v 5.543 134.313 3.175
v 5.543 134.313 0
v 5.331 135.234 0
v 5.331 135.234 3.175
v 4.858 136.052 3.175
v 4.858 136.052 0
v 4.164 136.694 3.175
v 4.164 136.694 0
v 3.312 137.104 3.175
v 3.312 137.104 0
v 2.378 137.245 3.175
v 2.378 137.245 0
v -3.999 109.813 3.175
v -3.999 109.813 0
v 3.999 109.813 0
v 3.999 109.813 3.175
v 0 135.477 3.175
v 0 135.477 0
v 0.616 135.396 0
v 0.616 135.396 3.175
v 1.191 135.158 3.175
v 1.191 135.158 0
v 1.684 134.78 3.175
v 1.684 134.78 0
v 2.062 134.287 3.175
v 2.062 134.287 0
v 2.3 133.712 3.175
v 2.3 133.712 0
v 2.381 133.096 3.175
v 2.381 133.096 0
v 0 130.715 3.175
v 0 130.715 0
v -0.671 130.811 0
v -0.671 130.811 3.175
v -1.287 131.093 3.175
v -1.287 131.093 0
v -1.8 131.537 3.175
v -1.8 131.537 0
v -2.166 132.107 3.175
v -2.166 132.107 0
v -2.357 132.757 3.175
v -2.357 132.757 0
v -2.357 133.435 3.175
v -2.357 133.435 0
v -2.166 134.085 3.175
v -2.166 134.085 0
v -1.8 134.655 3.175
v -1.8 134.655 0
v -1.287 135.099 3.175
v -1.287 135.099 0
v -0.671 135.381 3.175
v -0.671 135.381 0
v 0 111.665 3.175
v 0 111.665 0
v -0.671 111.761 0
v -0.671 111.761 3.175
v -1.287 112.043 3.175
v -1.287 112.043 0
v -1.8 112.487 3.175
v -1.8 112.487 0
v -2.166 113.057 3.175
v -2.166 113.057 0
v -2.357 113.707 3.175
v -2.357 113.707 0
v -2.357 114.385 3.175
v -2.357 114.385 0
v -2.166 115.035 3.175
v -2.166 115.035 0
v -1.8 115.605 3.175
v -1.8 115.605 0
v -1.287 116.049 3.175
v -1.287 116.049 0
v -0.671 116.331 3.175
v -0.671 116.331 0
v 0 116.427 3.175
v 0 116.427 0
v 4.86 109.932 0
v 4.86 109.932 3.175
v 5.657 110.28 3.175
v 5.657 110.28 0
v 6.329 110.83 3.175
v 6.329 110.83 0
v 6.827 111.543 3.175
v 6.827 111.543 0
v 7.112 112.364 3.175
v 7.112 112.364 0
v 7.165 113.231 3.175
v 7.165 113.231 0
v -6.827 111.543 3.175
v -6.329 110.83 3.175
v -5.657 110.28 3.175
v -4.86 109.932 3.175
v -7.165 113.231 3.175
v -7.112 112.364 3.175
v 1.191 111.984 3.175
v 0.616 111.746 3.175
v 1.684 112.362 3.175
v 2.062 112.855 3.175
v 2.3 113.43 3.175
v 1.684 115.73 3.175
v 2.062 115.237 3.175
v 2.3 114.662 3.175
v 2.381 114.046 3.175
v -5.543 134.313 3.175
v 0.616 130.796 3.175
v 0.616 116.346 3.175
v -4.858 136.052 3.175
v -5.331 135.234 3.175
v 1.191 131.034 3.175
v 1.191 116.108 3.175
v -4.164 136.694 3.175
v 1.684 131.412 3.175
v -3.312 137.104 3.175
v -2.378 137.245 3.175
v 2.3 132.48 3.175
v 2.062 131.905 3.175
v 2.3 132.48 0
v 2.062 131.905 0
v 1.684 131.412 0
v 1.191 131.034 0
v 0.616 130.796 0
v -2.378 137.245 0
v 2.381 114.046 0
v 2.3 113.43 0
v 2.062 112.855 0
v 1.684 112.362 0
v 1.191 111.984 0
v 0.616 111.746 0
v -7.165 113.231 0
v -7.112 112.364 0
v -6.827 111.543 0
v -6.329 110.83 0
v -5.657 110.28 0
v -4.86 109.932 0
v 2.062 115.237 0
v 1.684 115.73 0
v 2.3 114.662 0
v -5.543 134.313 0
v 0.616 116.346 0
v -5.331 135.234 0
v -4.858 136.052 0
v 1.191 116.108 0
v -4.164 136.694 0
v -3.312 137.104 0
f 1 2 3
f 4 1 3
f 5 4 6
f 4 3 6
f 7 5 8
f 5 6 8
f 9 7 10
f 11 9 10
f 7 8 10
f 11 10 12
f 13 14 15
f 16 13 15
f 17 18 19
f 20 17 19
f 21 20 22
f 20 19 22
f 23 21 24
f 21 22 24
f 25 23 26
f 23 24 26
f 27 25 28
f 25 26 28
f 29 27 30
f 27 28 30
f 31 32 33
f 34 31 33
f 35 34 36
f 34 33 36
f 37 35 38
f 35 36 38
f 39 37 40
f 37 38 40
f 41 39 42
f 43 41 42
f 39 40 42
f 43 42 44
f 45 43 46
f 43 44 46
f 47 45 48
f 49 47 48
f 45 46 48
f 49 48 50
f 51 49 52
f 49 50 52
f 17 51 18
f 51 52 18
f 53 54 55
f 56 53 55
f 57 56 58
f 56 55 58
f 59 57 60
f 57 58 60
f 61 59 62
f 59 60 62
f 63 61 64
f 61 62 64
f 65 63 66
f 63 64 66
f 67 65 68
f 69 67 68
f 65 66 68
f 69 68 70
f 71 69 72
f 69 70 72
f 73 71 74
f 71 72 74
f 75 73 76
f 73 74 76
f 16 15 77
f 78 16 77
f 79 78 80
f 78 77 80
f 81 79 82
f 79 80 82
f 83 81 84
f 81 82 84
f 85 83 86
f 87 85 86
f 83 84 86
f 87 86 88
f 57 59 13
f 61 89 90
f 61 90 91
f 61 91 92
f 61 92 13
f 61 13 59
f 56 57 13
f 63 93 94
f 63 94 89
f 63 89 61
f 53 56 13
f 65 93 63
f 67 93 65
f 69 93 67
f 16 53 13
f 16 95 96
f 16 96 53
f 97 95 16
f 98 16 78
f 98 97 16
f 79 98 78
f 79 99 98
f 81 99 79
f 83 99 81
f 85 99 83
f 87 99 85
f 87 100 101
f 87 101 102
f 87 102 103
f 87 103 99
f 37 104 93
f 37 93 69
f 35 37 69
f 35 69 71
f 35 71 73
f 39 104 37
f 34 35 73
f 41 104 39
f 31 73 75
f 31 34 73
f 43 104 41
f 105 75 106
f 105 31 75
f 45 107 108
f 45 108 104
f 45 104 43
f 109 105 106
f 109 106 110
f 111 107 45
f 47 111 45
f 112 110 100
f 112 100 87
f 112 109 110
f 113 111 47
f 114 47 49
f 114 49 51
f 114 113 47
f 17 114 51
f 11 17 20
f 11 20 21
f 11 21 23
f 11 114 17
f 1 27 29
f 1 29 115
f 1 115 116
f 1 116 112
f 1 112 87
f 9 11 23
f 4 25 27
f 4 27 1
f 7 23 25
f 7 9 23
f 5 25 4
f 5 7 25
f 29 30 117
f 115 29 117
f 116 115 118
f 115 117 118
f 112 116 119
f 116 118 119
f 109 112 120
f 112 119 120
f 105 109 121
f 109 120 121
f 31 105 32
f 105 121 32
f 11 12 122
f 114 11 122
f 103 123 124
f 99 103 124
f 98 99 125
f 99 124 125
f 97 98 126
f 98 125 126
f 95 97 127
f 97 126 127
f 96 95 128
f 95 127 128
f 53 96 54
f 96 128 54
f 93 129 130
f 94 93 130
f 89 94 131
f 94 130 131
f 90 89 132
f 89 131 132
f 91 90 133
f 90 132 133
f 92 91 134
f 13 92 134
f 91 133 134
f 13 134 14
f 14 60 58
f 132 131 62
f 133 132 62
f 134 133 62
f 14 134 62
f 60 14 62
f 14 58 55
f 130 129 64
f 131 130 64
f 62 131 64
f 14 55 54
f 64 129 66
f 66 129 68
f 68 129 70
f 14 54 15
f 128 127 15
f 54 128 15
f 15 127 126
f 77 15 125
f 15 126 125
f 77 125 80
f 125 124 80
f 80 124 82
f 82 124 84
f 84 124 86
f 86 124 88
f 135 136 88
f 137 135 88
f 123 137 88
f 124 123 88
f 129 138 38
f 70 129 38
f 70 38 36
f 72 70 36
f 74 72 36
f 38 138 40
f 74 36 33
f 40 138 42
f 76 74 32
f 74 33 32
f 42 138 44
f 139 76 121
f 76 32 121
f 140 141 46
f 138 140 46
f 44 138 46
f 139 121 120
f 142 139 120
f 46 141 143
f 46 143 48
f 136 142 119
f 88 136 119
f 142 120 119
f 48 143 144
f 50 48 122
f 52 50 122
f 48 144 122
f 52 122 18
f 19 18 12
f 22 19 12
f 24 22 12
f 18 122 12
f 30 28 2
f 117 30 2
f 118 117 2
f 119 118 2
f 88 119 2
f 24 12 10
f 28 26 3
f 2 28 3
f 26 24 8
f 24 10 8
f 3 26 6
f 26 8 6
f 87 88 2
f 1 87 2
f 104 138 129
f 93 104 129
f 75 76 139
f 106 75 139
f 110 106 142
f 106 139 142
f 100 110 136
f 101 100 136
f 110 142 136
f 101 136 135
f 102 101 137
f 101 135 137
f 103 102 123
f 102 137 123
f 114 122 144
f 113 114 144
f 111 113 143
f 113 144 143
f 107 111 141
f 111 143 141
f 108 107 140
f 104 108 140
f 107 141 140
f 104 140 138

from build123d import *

# Parameters (mm, degrees)
BOSS_EXTRUDE1_DEPTH = 3.175


with BuildPart() as part:
    # Sketch1 → Boss-Extrude1 (new body)
    with BuildSketch(Plane.XY):
        with BuildLine():
            Line((0, 135.477250085), (0, 137.244666667))
            Line((0, 137.244666667), (-2.377569082, 137.244666667))
            ThreePointArc((-2.377569082, 137.244666667), (-4.534821542, 136.399234614), (-5.543217073, 134.313178051))
            Line((-5.543217073, 134.313178051), (-7.164909381, 113.231178051))
            ThreePointArc((-7.164909381, 113.231178051), (-6.328829337, 110.830414206), (-3.999261389, 109.812666667))
            Line((-3.999261389, 109.812666667), (0, 109.812666667))
            Line((0, 109.812666667), (0, 111.664750085))
            ThreePointArc((0, 111.664750085), (-2.38125, 114.046000085), (0, 116.427250085))
            Line((0, 116.427250085), (0, 130.714750085))
            ThreePointArc((0, 130.714750085), (-2.38125, 133.096000085), (0, 135.477250085))
        make_face()
        with BuildLine():
            Line((7.164909381, 113.231178051), (5.543217073, 134.313178051))
            ThreePointArc((5.543217073, 134.313178051), (4.534821542, 136.399234614), (2.377569082, 137.244666667))
            Line((2.377569082, 137.244666667), (0, 137.244666667))
            Line((0, 137.244666667), (0, 135.477250085))
            ThreePointArc((0, 135.477250085), (1.683798023, 134.779798107), (2.38125, 133.096000085))
            ThreePointArc((2.38125, 133.096000085), (1.683798023, 131.412202062), (0, 130.714750085))
            Line((0, 130.714750085), (0, 116.427250085))
            ThreePointArc((0, 116.427250085), (1.683798023, 115.729798107), (2.38125, 114.046000085))
            ThreePointArc((2.38125, 114.046000085), (1.683798023, 112.362202062), (0, 111.664750085))
            Line((0, 111.664750085), (0, 109.812666667))
            Line((0, 109.812666667), (3.999261389, 109.812666667))
            ThreePointArc((3.999261389, 109.812666667), (6.328829337, 110.830414206), (7.164909381, 113.231178051))
        make_face()
    extrude(amount=BOSS_EXTRUDE1_DEPTH)


solid = part.part
